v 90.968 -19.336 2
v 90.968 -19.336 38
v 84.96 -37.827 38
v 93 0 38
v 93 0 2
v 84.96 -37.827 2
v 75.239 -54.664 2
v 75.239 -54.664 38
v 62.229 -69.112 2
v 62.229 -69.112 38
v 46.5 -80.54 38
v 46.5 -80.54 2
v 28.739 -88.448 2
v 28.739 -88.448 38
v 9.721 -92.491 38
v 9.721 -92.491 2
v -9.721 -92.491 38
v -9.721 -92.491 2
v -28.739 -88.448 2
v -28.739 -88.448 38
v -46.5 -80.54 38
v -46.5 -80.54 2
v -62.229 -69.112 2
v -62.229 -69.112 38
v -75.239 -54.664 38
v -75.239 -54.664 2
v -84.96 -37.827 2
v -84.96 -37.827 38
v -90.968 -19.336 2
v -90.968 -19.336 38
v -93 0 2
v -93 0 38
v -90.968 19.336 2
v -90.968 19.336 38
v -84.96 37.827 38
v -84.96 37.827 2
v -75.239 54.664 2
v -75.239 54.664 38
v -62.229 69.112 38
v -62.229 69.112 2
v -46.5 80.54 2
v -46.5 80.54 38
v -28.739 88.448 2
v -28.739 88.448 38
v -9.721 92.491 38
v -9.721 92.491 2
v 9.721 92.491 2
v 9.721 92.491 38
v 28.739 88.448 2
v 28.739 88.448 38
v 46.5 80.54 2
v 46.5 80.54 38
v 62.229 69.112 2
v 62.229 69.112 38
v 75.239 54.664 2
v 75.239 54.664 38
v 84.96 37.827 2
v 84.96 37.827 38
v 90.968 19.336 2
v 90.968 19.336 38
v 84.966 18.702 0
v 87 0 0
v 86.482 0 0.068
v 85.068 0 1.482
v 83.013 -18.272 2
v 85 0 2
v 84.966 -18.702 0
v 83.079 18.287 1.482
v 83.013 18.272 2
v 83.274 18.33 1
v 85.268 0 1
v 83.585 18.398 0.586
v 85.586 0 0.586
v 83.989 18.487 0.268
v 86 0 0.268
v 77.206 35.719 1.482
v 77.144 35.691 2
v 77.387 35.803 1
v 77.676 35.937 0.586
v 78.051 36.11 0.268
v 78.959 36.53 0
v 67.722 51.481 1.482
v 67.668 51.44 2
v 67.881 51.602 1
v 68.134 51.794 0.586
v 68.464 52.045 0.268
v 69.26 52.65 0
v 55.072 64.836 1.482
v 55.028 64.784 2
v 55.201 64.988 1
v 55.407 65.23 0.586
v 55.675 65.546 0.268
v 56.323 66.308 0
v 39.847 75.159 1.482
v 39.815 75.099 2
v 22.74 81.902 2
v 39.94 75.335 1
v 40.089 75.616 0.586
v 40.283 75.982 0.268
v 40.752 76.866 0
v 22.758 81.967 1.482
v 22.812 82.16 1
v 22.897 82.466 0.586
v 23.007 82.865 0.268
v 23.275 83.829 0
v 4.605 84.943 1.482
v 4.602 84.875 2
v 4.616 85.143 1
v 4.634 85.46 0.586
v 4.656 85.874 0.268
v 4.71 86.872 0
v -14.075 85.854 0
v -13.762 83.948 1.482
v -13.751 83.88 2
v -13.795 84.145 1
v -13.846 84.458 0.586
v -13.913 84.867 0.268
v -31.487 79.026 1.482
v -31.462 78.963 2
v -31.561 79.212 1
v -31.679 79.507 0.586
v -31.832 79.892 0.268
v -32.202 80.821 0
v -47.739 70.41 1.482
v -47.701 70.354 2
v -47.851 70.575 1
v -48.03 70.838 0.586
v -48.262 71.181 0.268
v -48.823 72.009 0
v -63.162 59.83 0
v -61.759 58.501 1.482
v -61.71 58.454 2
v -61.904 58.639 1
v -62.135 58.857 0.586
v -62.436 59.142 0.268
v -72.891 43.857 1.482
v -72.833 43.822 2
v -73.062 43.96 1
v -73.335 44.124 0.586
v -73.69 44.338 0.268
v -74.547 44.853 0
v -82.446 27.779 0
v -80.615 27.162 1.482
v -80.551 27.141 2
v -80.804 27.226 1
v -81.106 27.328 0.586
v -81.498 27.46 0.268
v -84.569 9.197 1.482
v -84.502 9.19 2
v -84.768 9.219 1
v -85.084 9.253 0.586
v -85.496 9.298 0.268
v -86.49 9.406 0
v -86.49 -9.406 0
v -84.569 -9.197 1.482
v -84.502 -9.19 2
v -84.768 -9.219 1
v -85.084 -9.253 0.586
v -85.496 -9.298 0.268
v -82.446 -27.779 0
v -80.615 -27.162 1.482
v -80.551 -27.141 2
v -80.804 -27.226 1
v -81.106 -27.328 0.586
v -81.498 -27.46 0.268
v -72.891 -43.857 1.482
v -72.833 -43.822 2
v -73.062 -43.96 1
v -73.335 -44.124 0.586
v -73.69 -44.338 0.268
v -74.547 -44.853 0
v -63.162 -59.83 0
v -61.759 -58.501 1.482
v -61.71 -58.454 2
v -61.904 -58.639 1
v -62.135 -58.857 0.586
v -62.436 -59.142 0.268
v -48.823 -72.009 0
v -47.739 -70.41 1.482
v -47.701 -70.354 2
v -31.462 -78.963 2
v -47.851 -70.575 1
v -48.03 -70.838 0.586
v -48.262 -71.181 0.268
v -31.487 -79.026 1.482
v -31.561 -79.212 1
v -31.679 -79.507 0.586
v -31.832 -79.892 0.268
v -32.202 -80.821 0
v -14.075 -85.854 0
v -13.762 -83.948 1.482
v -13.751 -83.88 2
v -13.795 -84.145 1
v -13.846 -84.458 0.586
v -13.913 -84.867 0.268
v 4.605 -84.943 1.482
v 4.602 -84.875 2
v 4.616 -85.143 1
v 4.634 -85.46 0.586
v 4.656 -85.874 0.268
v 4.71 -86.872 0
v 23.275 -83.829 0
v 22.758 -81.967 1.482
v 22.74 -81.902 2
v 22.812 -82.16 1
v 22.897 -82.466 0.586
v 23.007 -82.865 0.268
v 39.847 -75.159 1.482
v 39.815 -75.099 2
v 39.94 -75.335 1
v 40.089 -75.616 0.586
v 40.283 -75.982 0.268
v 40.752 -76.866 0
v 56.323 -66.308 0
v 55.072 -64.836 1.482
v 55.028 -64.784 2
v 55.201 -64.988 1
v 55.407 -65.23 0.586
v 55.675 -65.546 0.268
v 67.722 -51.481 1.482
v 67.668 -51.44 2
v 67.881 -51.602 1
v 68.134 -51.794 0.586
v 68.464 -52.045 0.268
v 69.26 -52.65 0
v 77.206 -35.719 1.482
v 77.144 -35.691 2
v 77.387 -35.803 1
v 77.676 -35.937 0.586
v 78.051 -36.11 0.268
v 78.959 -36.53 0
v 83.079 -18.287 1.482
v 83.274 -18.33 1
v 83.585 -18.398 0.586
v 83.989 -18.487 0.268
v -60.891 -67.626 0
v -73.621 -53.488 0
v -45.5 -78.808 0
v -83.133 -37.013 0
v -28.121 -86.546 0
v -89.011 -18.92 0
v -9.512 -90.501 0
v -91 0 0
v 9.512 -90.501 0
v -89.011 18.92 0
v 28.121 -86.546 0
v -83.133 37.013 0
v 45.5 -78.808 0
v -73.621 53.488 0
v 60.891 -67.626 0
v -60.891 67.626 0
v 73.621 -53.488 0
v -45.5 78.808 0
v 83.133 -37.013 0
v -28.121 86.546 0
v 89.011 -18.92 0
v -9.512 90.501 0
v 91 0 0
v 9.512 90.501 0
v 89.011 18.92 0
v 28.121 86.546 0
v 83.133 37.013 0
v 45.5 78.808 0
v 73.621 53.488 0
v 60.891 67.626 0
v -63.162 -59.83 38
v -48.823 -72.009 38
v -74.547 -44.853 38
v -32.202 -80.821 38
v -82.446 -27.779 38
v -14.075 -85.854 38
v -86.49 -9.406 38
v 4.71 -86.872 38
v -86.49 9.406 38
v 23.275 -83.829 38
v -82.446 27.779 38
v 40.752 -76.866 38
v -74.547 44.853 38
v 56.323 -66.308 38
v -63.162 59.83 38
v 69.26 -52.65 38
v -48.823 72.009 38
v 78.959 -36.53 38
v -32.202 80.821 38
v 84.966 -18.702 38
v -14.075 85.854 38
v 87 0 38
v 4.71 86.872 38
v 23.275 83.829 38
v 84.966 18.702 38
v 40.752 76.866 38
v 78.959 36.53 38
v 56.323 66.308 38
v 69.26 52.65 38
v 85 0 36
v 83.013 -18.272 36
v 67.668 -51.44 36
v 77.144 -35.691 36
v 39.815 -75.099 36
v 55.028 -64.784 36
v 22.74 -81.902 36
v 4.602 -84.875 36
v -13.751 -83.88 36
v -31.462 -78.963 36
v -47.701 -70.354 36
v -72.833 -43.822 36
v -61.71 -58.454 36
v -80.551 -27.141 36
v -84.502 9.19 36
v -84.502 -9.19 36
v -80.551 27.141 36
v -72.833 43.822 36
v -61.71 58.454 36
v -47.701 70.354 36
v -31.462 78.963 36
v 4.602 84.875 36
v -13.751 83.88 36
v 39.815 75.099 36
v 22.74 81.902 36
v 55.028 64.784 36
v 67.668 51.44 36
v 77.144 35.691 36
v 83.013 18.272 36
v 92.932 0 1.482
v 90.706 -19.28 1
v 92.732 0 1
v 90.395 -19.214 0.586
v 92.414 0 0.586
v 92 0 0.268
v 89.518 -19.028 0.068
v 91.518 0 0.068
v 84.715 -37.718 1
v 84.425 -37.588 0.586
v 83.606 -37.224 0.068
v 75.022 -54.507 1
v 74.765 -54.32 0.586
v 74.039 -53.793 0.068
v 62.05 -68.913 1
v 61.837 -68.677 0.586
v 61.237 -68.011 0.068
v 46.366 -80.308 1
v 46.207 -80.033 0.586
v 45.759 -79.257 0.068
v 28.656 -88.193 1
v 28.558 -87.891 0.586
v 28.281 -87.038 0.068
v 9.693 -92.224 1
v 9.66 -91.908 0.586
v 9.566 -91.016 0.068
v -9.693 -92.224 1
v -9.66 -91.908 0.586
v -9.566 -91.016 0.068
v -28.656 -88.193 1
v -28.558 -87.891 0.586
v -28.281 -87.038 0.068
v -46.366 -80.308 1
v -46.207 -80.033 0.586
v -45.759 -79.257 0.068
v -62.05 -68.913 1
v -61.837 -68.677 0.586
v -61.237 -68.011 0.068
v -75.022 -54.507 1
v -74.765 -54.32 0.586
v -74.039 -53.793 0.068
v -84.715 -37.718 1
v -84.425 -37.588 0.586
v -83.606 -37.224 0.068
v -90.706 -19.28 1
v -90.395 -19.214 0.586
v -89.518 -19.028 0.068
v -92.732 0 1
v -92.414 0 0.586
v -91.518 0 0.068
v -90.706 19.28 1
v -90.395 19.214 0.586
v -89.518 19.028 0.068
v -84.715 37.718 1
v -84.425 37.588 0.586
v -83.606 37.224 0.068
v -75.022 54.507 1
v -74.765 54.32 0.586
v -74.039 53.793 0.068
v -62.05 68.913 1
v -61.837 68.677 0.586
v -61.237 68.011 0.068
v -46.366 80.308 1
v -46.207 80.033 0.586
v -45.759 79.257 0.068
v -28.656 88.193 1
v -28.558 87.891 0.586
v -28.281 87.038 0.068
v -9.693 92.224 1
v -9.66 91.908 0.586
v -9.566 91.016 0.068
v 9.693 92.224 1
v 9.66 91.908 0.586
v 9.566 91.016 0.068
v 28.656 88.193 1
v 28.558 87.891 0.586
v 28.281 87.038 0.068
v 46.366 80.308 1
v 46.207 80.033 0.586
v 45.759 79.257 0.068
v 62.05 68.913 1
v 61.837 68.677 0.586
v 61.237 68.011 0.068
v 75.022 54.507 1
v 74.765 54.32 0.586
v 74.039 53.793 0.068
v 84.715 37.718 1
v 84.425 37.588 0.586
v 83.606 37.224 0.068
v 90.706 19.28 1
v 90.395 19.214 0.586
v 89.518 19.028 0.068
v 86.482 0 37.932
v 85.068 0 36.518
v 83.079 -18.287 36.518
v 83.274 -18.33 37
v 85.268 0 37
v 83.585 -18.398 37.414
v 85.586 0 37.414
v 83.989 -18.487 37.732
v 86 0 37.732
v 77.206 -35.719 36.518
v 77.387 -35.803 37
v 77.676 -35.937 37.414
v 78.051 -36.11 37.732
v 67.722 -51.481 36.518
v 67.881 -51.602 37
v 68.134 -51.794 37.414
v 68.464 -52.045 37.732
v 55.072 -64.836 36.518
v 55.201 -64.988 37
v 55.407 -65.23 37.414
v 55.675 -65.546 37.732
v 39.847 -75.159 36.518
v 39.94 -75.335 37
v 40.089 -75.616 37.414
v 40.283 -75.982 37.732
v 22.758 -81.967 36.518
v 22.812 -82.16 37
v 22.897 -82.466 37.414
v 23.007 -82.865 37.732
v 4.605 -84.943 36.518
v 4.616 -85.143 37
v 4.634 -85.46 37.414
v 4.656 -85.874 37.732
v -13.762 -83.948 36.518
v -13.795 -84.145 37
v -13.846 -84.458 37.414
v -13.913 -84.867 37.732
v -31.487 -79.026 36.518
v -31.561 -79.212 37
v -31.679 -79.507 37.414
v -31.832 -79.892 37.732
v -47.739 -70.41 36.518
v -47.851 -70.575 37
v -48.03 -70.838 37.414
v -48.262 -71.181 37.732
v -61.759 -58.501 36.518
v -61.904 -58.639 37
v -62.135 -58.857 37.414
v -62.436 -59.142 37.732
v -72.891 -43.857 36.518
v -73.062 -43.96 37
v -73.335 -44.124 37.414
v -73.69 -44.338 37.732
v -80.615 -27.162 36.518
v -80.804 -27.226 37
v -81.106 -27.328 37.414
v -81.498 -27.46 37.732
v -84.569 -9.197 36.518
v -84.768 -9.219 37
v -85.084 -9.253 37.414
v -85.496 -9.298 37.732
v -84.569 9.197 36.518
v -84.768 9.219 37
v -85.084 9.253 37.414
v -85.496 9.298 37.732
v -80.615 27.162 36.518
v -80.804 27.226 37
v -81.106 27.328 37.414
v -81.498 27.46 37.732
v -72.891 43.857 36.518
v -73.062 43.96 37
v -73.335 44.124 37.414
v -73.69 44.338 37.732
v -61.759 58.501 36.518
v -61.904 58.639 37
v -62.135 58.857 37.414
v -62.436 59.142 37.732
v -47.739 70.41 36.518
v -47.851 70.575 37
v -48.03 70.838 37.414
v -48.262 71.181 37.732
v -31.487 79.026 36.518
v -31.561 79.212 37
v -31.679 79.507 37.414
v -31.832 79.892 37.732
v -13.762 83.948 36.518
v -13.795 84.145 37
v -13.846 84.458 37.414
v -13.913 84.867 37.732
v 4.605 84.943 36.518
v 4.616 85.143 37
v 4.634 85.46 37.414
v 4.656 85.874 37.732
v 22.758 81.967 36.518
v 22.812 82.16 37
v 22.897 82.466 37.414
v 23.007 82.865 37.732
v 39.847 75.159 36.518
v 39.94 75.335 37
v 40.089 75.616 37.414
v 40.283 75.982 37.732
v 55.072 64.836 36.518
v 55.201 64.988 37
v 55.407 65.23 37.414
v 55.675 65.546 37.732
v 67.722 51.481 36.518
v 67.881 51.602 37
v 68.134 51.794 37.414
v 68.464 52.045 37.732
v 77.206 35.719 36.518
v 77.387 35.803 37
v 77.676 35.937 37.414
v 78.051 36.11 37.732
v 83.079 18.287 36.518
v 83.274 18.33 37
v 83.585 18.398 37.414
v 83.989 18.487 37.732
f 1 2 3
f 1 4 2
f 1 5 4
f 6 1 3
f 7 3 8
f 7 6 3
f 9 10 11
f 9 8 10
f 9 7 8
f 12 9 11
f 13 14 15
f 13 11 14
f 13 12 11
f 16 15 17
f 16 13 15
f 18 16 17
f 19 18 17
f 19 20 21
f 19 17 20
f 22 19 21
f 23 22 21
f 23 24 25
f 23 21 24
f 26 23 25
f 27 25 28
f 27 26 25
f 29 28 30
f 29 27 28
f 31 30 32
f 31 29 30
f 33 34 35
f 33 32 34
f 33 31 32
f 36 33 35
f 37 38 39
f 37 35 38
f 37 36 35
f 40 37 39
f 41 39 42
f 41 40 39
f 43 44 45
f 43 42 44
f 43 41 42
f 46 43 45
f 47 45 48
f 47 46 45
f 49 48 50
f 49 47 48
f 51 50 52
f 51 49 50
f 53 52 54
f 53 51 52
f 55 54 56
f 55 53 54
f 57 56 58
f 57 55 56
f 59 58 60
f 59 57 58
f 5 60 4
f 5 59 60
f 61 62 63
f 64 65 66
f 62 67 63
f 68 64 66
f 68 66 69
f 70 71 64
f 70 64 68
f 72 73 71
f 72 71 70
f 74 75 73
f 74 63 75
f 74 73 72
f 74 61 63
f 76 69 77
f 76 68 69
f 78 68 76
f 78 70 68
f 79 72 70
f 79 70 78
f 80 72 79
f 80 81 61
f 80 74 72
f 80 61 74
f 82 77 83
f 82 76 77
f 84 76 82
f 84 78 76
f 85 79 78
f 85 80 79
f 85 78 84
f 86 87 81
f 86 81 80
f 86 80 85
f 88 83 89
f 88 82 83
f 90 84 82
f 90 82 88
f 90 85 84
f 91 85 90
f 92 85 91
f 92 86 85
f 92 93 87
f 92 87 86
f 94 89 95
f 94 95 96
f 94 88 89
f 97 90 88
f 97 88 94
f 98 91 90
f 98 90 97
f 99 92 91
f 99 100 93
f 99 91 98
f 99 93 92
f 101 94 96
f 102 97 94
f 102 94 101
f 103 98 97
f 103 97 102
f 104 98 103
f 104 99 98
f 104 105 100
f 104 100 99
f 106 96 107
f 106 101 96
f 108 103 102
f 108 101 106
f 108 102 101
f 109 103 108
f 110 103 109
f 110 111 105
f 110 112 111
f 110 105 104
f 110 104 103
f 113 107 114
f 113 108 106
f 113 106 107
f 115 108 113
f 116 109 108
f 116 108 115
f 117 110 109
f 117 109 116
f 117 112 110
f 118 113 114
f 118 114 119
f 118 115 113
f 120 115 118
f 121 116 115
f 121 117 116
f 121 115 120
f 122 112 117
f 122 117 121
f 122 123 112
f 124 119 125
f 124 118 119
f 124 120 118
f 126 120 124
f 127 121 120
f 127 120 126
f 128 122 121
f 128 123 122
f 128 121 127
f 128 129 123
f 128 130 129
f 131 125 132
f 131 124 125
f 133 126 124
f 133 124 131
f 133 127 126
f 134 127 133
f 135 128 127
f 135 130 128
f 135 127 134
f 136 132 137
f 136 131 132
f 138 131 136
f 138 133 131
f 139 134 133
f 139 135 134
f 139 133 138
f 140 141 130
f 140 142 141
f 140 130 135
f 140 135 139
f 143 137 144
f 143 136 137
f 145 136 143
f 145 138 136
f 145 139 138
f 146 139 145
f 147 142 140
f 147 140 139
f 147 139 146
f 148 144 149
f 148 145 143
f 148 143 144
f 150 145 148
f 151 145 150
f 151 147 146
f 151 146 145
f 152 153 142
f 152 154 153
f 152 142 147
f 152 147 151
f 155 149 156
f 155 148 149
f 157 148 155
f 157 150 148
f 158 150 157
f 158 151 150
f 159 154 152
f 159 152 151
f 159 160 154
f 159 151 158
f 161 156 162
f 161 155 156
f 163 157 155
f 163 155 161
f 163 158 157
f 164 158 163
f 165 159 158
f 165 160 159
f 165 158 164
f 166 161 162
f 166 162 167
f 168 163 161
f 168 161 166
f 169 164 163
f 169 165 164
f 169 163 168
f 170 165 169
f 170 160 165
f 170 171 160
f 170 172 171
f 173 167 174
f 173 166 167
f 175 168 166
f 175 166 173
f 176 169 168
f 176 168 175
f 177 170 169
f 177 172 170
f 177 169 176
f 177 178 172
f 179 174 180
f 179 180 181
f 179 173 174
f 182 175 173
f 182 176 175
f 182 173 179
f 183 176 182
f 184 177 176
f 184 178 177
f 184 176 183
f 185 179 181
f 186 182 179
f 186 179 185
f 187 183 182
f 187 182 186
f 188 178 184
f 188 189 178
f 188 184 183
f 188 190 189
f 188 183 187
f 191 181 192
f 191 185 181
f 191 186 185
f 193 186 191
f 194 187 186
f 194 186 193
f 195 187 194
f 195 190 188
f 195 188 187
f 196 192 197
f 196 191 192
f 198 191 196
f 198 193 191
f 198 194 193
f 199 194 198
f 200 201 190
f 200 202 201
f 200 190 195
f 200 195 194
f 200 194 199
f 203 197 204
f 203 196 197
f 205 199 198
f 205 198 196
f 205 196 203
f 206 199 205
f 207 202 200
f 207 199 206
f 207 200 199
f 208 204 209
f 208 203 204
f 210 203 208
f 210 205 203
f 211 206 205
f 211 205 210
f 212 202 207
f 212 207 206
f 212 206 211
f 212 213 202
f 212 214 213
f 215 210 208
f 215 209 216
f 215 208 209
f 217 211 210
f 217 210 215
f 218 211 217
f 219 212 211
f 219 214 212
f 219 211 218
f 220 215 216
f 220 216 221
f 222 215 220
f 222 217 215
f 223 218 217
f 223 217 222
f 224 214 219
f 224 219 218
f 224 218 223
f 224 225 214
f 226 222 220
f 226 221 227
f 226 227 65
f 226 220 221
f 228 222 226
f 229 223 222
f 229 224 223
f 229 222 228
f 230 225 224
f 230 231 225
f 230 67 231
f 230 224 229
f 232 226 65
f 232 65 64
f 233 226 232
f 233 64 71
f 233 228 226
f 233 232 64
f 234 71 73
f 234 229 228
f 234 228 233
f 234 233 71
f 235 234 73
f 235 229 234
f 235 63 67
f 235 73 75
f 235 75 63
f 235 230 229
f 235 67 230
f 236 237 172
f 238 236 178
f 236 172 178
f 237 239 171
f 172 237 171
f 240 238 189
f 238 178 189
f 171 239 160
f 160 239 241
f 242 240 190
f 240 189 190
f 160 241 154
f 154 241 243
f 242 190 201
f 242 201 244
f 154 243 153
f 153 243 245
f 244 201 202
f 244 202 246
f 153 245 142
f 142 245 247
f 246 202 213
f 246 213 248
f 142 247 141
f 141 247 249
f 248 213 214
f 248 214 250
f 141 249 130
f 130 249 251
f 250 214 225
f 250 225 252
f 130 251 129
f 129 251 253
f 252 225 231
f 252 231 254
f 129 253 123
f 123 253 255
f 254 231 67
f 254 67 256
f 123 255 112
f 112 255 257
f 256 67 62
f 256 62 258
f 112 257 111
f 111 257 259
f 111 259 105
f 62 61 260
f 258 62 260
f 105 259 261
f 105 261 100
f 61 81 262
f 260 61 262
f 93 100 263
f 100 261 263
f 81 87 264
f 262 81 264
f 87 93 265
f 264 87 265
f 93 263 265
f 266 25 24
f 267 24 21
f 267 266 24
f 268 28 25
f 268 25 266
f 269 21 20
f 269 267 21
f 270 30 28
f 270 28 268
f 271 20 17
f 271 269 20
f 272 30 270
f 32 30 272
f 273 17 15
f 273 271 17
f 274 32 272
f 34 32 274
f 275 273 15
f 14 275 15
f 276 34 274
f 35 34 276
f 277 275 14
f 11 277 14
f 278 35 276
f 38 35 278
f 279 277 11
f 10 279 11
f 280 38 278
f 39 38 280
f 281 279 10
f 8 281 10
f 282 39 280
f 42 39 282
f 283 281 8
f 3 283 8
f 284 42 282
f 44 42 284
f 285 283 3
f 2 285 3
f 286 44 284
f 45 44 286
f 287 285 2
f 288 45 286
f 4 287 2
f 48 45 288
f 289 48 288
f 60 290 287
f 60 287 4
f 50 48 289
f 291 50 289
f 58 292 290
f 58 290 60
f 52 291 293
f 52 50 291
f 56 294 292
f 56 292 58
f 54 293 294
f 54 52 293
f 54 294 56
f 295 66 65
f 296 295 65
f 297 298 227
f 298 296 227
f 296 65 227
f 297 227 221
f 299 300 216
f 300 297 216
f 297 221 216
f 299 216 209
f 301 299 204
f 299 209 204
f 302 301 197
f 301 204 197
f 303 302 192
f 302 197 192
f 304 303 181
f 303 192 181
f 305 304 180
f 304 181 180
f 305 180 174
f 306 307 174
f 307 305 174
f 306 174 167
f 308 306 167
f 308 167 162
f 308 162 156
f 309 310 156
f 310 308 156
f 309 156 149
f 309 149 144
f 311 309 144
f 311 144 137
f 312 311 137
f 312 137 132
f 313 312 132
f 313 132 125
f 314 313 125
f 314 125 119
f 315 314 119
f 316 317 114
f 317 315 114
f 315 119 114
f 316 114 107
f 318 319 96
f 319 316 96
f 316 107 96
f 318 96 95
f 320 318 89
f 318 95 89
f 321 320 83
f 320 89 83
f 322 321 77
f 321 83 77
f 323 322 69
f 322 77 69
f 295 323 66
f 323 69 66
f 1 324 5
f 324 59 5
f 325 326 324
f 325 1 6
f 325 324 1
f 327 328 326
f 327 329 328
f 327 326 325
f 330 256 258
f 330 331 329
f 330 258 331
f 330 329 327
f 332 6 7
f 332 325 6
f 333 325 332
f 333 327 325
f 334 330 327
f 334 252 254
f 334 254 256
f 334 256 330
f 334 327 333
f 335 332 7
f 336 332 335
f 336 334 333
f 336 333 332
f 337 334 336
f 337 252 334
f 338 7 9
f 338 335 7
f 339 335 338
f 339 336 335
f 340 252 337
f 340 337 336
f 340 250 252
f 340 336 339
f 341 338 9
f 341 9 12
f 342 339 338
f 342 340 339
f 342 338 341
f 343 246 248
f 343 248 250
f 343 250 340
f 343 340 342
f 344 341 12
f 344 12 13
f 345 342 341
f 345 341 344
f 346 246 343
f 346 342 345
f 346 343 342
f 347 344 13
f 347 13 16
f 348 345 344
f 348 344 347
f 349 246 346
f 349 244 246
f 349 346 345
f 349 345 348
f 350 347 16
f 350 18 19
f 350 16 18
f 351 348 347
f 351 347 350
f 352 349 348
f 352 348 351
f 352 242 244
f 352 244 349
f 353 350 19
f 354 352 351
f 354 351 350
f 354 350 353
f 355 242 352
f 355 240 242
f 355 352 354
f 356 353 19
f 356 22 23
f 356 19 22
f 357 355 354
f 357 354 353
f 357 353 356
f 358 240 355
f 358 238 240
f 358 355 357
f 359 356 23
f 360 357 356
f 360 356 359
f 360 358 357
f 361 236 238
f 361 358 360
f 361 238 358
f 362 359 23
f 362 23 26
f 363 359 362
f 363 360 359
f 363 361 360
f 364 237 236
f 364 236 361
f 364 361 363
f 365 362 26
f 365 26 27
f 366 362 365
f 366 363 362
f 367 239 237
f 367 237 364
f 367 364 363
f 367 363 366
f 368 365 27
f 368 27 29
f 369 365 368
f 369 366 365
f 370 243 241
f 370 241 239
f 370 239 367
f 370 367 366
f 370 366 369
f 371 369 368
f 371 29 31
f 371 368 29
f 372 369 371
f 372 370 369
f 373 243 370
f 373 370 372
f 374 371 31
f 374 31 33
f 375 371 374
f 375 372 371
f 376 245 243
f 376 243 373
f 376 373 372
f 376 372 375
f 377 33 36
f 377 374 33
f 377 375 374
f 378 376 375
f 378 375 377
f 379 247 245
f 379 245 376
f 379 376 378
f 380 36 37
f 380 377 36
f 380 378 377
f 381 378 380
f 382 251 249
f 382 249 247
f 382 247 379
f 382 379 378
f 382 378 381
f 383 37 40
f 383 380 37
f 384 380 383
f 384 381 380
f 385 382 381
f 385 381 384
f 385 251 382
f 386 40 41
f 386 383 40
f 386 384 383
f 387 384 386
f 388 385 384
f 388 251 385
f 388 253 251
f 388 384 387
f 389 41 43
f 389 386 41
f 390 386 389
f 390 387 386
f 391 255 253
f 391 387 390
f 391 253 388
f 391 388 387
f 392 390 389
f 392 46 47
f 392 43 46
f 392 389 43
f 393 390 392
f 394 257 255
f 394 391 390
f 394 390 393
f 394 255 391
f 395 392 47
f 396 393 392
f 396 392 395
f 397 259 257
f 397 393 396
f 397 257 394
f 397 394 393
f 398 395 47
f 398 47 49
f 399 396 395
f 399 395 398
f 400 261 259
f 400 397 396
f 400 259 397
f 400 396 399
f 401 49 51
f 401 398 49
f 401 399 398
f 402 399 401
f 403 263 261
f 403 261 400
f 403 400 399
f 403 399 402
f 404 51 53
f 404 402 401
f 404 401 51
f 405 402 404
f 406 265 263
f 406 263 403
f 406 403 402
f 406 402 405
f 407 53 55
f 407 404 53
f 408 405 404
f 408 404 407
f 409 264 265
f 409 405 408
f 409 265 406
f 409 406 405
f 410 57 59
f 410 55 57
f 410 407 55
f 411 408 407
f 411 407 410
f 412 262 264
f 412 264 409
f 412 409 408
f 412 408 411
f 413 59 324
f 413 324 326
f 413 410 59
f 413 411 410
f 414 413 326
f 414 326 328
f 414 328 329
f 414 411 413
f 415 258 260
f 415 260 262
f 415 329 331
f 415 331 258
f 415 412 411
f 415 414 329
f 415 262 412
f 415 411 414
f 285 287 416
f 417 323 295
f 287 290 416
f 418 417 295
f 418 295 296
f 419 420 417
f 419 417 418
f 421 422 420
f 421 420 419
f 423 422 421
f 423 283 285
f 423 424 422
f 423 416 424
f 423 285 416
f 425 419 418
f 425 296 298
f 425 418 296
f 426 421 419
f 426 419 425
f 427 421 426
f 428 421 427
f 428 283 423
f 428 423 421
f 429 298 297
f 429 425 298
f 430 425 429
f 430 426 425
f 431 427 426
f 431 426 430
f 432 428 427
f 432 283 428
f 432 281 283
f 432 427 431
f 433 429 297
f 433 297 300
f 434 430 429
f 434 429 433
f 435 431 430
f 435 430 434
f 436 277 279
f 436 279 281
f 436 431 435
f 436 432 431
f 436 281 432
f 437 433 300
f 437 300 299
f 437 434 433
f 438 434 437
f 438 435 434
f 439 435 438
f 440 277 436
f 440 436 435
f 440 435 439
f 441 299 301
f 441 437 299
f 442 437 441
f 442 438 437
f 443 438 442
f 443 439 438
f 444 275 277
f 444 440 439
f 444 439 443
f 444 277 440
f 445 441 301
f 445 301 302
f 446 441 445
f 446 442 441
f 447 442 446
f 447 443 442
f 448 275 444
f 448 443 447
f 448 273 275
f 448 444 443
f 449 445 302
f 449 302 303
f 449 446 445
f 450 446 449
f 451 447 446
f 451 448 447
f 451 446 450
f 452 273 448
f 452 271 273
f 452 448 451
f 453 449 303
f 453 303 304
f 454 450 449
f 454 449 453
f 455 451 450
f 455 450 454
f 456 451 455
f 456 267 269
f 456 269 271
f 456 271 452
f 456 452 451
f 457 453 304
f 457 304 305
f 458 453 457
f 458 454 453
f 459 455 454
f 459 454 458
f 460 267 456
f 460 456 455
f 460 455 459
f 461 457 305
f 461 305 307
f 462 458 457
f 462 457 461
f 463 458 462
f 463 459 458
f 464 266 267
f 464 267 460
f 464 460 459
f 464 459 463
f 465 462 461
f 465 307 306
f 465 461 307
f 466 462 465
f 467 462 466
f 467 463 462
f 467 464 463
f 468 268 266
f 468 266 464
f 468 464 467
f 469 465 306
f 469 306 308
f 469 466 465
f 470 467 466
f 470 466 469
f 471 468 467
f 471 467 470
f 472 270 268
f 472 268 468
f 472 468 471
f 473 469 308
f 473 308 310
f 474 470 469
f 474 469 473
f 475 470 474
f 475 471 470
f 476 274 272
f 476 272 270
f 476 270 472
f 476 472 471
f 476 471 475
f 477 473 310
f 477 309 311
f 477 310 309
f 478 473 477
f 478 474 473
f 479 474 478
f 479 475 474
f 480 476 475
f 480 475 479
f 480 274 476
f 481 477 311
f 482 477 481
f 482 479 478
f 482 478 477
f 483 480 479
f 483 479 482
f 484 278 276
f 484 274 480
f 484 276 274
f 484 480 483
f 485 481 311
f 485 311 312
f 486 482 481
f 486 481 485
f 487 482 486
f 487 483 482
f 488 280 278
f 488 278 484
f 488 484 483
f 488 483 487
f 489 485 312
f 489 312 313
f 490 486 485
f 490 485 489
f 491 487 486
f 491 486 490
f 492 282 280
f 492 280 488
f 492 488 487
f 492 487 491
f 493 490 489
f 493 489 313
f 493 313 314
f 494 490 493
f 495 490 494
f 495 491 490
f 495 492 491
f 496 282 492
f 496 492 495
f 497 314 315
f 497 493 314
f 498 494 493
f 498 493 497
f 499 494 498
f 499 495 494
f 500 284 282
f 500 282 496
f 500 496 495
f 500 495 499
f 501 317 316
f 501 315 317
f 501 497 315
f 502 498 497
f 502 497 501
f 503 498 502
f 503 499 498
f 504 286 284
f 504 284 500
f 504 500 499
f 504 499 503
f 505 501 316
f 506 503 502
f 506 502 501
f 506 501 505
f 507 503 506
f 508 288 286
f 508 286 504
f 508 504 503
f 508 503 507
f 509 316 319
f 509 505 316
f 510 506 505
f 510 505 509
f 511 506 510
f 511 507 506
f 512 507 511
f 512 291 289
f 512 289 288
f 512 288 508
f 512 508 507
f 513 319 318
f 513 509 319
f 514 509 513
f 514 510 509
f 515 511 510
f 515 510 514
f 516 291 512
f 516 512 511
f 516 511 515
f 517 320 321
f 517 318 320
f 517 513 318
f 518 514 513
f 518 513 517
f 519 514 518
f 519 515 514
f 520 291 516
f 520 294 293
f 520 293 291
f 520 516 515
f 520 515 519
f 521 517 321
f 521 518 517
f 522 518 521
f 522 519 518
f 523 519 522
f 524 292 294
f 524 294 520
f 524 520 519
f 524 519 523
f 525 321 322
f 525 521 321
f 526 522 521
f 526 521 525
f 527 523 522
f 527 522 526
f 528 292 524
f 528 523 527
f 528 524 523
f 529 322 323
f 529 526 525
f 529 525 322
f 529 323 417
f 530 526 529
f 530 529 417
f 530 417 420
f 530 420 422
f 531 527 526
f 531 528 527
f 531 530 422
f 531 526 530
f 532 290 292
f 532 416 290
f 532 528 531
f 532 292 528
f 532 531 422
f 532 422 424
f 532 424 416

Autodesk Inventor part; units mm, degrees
ref_plane "YZ Plane" through (0, 0, 0) normal (1, 0, 0) x (0, 1, 0)
ref_plane "XZ Plane" through (0, 0, 0) normal (0, 1, 0) x (-1, 0, 0)
ref_plane "XY Plane" through (0, 0, 0) normal (0, 0, 1) x (1, 0, 0)
sketch "Sketch1" plane through (0, 0, 0) normal (0, 0, 1) x (1, 0, 0)
  circle A0 centre (0, 0) radius 93
  circle A1 centre (0, 0) radius 85
  dimension "d0" = 186
  dimension "d1" = 170
extrude "Extrusion1" add sketch "Sketch1" along normal blind 38
fillet "Fillet1" radius 2 3 edges at (-85, 0, 38) (-85, 0, 0) (-93, 0, 0)
properties part number "Flywheel outer rim" material "Steel, Carbon"
